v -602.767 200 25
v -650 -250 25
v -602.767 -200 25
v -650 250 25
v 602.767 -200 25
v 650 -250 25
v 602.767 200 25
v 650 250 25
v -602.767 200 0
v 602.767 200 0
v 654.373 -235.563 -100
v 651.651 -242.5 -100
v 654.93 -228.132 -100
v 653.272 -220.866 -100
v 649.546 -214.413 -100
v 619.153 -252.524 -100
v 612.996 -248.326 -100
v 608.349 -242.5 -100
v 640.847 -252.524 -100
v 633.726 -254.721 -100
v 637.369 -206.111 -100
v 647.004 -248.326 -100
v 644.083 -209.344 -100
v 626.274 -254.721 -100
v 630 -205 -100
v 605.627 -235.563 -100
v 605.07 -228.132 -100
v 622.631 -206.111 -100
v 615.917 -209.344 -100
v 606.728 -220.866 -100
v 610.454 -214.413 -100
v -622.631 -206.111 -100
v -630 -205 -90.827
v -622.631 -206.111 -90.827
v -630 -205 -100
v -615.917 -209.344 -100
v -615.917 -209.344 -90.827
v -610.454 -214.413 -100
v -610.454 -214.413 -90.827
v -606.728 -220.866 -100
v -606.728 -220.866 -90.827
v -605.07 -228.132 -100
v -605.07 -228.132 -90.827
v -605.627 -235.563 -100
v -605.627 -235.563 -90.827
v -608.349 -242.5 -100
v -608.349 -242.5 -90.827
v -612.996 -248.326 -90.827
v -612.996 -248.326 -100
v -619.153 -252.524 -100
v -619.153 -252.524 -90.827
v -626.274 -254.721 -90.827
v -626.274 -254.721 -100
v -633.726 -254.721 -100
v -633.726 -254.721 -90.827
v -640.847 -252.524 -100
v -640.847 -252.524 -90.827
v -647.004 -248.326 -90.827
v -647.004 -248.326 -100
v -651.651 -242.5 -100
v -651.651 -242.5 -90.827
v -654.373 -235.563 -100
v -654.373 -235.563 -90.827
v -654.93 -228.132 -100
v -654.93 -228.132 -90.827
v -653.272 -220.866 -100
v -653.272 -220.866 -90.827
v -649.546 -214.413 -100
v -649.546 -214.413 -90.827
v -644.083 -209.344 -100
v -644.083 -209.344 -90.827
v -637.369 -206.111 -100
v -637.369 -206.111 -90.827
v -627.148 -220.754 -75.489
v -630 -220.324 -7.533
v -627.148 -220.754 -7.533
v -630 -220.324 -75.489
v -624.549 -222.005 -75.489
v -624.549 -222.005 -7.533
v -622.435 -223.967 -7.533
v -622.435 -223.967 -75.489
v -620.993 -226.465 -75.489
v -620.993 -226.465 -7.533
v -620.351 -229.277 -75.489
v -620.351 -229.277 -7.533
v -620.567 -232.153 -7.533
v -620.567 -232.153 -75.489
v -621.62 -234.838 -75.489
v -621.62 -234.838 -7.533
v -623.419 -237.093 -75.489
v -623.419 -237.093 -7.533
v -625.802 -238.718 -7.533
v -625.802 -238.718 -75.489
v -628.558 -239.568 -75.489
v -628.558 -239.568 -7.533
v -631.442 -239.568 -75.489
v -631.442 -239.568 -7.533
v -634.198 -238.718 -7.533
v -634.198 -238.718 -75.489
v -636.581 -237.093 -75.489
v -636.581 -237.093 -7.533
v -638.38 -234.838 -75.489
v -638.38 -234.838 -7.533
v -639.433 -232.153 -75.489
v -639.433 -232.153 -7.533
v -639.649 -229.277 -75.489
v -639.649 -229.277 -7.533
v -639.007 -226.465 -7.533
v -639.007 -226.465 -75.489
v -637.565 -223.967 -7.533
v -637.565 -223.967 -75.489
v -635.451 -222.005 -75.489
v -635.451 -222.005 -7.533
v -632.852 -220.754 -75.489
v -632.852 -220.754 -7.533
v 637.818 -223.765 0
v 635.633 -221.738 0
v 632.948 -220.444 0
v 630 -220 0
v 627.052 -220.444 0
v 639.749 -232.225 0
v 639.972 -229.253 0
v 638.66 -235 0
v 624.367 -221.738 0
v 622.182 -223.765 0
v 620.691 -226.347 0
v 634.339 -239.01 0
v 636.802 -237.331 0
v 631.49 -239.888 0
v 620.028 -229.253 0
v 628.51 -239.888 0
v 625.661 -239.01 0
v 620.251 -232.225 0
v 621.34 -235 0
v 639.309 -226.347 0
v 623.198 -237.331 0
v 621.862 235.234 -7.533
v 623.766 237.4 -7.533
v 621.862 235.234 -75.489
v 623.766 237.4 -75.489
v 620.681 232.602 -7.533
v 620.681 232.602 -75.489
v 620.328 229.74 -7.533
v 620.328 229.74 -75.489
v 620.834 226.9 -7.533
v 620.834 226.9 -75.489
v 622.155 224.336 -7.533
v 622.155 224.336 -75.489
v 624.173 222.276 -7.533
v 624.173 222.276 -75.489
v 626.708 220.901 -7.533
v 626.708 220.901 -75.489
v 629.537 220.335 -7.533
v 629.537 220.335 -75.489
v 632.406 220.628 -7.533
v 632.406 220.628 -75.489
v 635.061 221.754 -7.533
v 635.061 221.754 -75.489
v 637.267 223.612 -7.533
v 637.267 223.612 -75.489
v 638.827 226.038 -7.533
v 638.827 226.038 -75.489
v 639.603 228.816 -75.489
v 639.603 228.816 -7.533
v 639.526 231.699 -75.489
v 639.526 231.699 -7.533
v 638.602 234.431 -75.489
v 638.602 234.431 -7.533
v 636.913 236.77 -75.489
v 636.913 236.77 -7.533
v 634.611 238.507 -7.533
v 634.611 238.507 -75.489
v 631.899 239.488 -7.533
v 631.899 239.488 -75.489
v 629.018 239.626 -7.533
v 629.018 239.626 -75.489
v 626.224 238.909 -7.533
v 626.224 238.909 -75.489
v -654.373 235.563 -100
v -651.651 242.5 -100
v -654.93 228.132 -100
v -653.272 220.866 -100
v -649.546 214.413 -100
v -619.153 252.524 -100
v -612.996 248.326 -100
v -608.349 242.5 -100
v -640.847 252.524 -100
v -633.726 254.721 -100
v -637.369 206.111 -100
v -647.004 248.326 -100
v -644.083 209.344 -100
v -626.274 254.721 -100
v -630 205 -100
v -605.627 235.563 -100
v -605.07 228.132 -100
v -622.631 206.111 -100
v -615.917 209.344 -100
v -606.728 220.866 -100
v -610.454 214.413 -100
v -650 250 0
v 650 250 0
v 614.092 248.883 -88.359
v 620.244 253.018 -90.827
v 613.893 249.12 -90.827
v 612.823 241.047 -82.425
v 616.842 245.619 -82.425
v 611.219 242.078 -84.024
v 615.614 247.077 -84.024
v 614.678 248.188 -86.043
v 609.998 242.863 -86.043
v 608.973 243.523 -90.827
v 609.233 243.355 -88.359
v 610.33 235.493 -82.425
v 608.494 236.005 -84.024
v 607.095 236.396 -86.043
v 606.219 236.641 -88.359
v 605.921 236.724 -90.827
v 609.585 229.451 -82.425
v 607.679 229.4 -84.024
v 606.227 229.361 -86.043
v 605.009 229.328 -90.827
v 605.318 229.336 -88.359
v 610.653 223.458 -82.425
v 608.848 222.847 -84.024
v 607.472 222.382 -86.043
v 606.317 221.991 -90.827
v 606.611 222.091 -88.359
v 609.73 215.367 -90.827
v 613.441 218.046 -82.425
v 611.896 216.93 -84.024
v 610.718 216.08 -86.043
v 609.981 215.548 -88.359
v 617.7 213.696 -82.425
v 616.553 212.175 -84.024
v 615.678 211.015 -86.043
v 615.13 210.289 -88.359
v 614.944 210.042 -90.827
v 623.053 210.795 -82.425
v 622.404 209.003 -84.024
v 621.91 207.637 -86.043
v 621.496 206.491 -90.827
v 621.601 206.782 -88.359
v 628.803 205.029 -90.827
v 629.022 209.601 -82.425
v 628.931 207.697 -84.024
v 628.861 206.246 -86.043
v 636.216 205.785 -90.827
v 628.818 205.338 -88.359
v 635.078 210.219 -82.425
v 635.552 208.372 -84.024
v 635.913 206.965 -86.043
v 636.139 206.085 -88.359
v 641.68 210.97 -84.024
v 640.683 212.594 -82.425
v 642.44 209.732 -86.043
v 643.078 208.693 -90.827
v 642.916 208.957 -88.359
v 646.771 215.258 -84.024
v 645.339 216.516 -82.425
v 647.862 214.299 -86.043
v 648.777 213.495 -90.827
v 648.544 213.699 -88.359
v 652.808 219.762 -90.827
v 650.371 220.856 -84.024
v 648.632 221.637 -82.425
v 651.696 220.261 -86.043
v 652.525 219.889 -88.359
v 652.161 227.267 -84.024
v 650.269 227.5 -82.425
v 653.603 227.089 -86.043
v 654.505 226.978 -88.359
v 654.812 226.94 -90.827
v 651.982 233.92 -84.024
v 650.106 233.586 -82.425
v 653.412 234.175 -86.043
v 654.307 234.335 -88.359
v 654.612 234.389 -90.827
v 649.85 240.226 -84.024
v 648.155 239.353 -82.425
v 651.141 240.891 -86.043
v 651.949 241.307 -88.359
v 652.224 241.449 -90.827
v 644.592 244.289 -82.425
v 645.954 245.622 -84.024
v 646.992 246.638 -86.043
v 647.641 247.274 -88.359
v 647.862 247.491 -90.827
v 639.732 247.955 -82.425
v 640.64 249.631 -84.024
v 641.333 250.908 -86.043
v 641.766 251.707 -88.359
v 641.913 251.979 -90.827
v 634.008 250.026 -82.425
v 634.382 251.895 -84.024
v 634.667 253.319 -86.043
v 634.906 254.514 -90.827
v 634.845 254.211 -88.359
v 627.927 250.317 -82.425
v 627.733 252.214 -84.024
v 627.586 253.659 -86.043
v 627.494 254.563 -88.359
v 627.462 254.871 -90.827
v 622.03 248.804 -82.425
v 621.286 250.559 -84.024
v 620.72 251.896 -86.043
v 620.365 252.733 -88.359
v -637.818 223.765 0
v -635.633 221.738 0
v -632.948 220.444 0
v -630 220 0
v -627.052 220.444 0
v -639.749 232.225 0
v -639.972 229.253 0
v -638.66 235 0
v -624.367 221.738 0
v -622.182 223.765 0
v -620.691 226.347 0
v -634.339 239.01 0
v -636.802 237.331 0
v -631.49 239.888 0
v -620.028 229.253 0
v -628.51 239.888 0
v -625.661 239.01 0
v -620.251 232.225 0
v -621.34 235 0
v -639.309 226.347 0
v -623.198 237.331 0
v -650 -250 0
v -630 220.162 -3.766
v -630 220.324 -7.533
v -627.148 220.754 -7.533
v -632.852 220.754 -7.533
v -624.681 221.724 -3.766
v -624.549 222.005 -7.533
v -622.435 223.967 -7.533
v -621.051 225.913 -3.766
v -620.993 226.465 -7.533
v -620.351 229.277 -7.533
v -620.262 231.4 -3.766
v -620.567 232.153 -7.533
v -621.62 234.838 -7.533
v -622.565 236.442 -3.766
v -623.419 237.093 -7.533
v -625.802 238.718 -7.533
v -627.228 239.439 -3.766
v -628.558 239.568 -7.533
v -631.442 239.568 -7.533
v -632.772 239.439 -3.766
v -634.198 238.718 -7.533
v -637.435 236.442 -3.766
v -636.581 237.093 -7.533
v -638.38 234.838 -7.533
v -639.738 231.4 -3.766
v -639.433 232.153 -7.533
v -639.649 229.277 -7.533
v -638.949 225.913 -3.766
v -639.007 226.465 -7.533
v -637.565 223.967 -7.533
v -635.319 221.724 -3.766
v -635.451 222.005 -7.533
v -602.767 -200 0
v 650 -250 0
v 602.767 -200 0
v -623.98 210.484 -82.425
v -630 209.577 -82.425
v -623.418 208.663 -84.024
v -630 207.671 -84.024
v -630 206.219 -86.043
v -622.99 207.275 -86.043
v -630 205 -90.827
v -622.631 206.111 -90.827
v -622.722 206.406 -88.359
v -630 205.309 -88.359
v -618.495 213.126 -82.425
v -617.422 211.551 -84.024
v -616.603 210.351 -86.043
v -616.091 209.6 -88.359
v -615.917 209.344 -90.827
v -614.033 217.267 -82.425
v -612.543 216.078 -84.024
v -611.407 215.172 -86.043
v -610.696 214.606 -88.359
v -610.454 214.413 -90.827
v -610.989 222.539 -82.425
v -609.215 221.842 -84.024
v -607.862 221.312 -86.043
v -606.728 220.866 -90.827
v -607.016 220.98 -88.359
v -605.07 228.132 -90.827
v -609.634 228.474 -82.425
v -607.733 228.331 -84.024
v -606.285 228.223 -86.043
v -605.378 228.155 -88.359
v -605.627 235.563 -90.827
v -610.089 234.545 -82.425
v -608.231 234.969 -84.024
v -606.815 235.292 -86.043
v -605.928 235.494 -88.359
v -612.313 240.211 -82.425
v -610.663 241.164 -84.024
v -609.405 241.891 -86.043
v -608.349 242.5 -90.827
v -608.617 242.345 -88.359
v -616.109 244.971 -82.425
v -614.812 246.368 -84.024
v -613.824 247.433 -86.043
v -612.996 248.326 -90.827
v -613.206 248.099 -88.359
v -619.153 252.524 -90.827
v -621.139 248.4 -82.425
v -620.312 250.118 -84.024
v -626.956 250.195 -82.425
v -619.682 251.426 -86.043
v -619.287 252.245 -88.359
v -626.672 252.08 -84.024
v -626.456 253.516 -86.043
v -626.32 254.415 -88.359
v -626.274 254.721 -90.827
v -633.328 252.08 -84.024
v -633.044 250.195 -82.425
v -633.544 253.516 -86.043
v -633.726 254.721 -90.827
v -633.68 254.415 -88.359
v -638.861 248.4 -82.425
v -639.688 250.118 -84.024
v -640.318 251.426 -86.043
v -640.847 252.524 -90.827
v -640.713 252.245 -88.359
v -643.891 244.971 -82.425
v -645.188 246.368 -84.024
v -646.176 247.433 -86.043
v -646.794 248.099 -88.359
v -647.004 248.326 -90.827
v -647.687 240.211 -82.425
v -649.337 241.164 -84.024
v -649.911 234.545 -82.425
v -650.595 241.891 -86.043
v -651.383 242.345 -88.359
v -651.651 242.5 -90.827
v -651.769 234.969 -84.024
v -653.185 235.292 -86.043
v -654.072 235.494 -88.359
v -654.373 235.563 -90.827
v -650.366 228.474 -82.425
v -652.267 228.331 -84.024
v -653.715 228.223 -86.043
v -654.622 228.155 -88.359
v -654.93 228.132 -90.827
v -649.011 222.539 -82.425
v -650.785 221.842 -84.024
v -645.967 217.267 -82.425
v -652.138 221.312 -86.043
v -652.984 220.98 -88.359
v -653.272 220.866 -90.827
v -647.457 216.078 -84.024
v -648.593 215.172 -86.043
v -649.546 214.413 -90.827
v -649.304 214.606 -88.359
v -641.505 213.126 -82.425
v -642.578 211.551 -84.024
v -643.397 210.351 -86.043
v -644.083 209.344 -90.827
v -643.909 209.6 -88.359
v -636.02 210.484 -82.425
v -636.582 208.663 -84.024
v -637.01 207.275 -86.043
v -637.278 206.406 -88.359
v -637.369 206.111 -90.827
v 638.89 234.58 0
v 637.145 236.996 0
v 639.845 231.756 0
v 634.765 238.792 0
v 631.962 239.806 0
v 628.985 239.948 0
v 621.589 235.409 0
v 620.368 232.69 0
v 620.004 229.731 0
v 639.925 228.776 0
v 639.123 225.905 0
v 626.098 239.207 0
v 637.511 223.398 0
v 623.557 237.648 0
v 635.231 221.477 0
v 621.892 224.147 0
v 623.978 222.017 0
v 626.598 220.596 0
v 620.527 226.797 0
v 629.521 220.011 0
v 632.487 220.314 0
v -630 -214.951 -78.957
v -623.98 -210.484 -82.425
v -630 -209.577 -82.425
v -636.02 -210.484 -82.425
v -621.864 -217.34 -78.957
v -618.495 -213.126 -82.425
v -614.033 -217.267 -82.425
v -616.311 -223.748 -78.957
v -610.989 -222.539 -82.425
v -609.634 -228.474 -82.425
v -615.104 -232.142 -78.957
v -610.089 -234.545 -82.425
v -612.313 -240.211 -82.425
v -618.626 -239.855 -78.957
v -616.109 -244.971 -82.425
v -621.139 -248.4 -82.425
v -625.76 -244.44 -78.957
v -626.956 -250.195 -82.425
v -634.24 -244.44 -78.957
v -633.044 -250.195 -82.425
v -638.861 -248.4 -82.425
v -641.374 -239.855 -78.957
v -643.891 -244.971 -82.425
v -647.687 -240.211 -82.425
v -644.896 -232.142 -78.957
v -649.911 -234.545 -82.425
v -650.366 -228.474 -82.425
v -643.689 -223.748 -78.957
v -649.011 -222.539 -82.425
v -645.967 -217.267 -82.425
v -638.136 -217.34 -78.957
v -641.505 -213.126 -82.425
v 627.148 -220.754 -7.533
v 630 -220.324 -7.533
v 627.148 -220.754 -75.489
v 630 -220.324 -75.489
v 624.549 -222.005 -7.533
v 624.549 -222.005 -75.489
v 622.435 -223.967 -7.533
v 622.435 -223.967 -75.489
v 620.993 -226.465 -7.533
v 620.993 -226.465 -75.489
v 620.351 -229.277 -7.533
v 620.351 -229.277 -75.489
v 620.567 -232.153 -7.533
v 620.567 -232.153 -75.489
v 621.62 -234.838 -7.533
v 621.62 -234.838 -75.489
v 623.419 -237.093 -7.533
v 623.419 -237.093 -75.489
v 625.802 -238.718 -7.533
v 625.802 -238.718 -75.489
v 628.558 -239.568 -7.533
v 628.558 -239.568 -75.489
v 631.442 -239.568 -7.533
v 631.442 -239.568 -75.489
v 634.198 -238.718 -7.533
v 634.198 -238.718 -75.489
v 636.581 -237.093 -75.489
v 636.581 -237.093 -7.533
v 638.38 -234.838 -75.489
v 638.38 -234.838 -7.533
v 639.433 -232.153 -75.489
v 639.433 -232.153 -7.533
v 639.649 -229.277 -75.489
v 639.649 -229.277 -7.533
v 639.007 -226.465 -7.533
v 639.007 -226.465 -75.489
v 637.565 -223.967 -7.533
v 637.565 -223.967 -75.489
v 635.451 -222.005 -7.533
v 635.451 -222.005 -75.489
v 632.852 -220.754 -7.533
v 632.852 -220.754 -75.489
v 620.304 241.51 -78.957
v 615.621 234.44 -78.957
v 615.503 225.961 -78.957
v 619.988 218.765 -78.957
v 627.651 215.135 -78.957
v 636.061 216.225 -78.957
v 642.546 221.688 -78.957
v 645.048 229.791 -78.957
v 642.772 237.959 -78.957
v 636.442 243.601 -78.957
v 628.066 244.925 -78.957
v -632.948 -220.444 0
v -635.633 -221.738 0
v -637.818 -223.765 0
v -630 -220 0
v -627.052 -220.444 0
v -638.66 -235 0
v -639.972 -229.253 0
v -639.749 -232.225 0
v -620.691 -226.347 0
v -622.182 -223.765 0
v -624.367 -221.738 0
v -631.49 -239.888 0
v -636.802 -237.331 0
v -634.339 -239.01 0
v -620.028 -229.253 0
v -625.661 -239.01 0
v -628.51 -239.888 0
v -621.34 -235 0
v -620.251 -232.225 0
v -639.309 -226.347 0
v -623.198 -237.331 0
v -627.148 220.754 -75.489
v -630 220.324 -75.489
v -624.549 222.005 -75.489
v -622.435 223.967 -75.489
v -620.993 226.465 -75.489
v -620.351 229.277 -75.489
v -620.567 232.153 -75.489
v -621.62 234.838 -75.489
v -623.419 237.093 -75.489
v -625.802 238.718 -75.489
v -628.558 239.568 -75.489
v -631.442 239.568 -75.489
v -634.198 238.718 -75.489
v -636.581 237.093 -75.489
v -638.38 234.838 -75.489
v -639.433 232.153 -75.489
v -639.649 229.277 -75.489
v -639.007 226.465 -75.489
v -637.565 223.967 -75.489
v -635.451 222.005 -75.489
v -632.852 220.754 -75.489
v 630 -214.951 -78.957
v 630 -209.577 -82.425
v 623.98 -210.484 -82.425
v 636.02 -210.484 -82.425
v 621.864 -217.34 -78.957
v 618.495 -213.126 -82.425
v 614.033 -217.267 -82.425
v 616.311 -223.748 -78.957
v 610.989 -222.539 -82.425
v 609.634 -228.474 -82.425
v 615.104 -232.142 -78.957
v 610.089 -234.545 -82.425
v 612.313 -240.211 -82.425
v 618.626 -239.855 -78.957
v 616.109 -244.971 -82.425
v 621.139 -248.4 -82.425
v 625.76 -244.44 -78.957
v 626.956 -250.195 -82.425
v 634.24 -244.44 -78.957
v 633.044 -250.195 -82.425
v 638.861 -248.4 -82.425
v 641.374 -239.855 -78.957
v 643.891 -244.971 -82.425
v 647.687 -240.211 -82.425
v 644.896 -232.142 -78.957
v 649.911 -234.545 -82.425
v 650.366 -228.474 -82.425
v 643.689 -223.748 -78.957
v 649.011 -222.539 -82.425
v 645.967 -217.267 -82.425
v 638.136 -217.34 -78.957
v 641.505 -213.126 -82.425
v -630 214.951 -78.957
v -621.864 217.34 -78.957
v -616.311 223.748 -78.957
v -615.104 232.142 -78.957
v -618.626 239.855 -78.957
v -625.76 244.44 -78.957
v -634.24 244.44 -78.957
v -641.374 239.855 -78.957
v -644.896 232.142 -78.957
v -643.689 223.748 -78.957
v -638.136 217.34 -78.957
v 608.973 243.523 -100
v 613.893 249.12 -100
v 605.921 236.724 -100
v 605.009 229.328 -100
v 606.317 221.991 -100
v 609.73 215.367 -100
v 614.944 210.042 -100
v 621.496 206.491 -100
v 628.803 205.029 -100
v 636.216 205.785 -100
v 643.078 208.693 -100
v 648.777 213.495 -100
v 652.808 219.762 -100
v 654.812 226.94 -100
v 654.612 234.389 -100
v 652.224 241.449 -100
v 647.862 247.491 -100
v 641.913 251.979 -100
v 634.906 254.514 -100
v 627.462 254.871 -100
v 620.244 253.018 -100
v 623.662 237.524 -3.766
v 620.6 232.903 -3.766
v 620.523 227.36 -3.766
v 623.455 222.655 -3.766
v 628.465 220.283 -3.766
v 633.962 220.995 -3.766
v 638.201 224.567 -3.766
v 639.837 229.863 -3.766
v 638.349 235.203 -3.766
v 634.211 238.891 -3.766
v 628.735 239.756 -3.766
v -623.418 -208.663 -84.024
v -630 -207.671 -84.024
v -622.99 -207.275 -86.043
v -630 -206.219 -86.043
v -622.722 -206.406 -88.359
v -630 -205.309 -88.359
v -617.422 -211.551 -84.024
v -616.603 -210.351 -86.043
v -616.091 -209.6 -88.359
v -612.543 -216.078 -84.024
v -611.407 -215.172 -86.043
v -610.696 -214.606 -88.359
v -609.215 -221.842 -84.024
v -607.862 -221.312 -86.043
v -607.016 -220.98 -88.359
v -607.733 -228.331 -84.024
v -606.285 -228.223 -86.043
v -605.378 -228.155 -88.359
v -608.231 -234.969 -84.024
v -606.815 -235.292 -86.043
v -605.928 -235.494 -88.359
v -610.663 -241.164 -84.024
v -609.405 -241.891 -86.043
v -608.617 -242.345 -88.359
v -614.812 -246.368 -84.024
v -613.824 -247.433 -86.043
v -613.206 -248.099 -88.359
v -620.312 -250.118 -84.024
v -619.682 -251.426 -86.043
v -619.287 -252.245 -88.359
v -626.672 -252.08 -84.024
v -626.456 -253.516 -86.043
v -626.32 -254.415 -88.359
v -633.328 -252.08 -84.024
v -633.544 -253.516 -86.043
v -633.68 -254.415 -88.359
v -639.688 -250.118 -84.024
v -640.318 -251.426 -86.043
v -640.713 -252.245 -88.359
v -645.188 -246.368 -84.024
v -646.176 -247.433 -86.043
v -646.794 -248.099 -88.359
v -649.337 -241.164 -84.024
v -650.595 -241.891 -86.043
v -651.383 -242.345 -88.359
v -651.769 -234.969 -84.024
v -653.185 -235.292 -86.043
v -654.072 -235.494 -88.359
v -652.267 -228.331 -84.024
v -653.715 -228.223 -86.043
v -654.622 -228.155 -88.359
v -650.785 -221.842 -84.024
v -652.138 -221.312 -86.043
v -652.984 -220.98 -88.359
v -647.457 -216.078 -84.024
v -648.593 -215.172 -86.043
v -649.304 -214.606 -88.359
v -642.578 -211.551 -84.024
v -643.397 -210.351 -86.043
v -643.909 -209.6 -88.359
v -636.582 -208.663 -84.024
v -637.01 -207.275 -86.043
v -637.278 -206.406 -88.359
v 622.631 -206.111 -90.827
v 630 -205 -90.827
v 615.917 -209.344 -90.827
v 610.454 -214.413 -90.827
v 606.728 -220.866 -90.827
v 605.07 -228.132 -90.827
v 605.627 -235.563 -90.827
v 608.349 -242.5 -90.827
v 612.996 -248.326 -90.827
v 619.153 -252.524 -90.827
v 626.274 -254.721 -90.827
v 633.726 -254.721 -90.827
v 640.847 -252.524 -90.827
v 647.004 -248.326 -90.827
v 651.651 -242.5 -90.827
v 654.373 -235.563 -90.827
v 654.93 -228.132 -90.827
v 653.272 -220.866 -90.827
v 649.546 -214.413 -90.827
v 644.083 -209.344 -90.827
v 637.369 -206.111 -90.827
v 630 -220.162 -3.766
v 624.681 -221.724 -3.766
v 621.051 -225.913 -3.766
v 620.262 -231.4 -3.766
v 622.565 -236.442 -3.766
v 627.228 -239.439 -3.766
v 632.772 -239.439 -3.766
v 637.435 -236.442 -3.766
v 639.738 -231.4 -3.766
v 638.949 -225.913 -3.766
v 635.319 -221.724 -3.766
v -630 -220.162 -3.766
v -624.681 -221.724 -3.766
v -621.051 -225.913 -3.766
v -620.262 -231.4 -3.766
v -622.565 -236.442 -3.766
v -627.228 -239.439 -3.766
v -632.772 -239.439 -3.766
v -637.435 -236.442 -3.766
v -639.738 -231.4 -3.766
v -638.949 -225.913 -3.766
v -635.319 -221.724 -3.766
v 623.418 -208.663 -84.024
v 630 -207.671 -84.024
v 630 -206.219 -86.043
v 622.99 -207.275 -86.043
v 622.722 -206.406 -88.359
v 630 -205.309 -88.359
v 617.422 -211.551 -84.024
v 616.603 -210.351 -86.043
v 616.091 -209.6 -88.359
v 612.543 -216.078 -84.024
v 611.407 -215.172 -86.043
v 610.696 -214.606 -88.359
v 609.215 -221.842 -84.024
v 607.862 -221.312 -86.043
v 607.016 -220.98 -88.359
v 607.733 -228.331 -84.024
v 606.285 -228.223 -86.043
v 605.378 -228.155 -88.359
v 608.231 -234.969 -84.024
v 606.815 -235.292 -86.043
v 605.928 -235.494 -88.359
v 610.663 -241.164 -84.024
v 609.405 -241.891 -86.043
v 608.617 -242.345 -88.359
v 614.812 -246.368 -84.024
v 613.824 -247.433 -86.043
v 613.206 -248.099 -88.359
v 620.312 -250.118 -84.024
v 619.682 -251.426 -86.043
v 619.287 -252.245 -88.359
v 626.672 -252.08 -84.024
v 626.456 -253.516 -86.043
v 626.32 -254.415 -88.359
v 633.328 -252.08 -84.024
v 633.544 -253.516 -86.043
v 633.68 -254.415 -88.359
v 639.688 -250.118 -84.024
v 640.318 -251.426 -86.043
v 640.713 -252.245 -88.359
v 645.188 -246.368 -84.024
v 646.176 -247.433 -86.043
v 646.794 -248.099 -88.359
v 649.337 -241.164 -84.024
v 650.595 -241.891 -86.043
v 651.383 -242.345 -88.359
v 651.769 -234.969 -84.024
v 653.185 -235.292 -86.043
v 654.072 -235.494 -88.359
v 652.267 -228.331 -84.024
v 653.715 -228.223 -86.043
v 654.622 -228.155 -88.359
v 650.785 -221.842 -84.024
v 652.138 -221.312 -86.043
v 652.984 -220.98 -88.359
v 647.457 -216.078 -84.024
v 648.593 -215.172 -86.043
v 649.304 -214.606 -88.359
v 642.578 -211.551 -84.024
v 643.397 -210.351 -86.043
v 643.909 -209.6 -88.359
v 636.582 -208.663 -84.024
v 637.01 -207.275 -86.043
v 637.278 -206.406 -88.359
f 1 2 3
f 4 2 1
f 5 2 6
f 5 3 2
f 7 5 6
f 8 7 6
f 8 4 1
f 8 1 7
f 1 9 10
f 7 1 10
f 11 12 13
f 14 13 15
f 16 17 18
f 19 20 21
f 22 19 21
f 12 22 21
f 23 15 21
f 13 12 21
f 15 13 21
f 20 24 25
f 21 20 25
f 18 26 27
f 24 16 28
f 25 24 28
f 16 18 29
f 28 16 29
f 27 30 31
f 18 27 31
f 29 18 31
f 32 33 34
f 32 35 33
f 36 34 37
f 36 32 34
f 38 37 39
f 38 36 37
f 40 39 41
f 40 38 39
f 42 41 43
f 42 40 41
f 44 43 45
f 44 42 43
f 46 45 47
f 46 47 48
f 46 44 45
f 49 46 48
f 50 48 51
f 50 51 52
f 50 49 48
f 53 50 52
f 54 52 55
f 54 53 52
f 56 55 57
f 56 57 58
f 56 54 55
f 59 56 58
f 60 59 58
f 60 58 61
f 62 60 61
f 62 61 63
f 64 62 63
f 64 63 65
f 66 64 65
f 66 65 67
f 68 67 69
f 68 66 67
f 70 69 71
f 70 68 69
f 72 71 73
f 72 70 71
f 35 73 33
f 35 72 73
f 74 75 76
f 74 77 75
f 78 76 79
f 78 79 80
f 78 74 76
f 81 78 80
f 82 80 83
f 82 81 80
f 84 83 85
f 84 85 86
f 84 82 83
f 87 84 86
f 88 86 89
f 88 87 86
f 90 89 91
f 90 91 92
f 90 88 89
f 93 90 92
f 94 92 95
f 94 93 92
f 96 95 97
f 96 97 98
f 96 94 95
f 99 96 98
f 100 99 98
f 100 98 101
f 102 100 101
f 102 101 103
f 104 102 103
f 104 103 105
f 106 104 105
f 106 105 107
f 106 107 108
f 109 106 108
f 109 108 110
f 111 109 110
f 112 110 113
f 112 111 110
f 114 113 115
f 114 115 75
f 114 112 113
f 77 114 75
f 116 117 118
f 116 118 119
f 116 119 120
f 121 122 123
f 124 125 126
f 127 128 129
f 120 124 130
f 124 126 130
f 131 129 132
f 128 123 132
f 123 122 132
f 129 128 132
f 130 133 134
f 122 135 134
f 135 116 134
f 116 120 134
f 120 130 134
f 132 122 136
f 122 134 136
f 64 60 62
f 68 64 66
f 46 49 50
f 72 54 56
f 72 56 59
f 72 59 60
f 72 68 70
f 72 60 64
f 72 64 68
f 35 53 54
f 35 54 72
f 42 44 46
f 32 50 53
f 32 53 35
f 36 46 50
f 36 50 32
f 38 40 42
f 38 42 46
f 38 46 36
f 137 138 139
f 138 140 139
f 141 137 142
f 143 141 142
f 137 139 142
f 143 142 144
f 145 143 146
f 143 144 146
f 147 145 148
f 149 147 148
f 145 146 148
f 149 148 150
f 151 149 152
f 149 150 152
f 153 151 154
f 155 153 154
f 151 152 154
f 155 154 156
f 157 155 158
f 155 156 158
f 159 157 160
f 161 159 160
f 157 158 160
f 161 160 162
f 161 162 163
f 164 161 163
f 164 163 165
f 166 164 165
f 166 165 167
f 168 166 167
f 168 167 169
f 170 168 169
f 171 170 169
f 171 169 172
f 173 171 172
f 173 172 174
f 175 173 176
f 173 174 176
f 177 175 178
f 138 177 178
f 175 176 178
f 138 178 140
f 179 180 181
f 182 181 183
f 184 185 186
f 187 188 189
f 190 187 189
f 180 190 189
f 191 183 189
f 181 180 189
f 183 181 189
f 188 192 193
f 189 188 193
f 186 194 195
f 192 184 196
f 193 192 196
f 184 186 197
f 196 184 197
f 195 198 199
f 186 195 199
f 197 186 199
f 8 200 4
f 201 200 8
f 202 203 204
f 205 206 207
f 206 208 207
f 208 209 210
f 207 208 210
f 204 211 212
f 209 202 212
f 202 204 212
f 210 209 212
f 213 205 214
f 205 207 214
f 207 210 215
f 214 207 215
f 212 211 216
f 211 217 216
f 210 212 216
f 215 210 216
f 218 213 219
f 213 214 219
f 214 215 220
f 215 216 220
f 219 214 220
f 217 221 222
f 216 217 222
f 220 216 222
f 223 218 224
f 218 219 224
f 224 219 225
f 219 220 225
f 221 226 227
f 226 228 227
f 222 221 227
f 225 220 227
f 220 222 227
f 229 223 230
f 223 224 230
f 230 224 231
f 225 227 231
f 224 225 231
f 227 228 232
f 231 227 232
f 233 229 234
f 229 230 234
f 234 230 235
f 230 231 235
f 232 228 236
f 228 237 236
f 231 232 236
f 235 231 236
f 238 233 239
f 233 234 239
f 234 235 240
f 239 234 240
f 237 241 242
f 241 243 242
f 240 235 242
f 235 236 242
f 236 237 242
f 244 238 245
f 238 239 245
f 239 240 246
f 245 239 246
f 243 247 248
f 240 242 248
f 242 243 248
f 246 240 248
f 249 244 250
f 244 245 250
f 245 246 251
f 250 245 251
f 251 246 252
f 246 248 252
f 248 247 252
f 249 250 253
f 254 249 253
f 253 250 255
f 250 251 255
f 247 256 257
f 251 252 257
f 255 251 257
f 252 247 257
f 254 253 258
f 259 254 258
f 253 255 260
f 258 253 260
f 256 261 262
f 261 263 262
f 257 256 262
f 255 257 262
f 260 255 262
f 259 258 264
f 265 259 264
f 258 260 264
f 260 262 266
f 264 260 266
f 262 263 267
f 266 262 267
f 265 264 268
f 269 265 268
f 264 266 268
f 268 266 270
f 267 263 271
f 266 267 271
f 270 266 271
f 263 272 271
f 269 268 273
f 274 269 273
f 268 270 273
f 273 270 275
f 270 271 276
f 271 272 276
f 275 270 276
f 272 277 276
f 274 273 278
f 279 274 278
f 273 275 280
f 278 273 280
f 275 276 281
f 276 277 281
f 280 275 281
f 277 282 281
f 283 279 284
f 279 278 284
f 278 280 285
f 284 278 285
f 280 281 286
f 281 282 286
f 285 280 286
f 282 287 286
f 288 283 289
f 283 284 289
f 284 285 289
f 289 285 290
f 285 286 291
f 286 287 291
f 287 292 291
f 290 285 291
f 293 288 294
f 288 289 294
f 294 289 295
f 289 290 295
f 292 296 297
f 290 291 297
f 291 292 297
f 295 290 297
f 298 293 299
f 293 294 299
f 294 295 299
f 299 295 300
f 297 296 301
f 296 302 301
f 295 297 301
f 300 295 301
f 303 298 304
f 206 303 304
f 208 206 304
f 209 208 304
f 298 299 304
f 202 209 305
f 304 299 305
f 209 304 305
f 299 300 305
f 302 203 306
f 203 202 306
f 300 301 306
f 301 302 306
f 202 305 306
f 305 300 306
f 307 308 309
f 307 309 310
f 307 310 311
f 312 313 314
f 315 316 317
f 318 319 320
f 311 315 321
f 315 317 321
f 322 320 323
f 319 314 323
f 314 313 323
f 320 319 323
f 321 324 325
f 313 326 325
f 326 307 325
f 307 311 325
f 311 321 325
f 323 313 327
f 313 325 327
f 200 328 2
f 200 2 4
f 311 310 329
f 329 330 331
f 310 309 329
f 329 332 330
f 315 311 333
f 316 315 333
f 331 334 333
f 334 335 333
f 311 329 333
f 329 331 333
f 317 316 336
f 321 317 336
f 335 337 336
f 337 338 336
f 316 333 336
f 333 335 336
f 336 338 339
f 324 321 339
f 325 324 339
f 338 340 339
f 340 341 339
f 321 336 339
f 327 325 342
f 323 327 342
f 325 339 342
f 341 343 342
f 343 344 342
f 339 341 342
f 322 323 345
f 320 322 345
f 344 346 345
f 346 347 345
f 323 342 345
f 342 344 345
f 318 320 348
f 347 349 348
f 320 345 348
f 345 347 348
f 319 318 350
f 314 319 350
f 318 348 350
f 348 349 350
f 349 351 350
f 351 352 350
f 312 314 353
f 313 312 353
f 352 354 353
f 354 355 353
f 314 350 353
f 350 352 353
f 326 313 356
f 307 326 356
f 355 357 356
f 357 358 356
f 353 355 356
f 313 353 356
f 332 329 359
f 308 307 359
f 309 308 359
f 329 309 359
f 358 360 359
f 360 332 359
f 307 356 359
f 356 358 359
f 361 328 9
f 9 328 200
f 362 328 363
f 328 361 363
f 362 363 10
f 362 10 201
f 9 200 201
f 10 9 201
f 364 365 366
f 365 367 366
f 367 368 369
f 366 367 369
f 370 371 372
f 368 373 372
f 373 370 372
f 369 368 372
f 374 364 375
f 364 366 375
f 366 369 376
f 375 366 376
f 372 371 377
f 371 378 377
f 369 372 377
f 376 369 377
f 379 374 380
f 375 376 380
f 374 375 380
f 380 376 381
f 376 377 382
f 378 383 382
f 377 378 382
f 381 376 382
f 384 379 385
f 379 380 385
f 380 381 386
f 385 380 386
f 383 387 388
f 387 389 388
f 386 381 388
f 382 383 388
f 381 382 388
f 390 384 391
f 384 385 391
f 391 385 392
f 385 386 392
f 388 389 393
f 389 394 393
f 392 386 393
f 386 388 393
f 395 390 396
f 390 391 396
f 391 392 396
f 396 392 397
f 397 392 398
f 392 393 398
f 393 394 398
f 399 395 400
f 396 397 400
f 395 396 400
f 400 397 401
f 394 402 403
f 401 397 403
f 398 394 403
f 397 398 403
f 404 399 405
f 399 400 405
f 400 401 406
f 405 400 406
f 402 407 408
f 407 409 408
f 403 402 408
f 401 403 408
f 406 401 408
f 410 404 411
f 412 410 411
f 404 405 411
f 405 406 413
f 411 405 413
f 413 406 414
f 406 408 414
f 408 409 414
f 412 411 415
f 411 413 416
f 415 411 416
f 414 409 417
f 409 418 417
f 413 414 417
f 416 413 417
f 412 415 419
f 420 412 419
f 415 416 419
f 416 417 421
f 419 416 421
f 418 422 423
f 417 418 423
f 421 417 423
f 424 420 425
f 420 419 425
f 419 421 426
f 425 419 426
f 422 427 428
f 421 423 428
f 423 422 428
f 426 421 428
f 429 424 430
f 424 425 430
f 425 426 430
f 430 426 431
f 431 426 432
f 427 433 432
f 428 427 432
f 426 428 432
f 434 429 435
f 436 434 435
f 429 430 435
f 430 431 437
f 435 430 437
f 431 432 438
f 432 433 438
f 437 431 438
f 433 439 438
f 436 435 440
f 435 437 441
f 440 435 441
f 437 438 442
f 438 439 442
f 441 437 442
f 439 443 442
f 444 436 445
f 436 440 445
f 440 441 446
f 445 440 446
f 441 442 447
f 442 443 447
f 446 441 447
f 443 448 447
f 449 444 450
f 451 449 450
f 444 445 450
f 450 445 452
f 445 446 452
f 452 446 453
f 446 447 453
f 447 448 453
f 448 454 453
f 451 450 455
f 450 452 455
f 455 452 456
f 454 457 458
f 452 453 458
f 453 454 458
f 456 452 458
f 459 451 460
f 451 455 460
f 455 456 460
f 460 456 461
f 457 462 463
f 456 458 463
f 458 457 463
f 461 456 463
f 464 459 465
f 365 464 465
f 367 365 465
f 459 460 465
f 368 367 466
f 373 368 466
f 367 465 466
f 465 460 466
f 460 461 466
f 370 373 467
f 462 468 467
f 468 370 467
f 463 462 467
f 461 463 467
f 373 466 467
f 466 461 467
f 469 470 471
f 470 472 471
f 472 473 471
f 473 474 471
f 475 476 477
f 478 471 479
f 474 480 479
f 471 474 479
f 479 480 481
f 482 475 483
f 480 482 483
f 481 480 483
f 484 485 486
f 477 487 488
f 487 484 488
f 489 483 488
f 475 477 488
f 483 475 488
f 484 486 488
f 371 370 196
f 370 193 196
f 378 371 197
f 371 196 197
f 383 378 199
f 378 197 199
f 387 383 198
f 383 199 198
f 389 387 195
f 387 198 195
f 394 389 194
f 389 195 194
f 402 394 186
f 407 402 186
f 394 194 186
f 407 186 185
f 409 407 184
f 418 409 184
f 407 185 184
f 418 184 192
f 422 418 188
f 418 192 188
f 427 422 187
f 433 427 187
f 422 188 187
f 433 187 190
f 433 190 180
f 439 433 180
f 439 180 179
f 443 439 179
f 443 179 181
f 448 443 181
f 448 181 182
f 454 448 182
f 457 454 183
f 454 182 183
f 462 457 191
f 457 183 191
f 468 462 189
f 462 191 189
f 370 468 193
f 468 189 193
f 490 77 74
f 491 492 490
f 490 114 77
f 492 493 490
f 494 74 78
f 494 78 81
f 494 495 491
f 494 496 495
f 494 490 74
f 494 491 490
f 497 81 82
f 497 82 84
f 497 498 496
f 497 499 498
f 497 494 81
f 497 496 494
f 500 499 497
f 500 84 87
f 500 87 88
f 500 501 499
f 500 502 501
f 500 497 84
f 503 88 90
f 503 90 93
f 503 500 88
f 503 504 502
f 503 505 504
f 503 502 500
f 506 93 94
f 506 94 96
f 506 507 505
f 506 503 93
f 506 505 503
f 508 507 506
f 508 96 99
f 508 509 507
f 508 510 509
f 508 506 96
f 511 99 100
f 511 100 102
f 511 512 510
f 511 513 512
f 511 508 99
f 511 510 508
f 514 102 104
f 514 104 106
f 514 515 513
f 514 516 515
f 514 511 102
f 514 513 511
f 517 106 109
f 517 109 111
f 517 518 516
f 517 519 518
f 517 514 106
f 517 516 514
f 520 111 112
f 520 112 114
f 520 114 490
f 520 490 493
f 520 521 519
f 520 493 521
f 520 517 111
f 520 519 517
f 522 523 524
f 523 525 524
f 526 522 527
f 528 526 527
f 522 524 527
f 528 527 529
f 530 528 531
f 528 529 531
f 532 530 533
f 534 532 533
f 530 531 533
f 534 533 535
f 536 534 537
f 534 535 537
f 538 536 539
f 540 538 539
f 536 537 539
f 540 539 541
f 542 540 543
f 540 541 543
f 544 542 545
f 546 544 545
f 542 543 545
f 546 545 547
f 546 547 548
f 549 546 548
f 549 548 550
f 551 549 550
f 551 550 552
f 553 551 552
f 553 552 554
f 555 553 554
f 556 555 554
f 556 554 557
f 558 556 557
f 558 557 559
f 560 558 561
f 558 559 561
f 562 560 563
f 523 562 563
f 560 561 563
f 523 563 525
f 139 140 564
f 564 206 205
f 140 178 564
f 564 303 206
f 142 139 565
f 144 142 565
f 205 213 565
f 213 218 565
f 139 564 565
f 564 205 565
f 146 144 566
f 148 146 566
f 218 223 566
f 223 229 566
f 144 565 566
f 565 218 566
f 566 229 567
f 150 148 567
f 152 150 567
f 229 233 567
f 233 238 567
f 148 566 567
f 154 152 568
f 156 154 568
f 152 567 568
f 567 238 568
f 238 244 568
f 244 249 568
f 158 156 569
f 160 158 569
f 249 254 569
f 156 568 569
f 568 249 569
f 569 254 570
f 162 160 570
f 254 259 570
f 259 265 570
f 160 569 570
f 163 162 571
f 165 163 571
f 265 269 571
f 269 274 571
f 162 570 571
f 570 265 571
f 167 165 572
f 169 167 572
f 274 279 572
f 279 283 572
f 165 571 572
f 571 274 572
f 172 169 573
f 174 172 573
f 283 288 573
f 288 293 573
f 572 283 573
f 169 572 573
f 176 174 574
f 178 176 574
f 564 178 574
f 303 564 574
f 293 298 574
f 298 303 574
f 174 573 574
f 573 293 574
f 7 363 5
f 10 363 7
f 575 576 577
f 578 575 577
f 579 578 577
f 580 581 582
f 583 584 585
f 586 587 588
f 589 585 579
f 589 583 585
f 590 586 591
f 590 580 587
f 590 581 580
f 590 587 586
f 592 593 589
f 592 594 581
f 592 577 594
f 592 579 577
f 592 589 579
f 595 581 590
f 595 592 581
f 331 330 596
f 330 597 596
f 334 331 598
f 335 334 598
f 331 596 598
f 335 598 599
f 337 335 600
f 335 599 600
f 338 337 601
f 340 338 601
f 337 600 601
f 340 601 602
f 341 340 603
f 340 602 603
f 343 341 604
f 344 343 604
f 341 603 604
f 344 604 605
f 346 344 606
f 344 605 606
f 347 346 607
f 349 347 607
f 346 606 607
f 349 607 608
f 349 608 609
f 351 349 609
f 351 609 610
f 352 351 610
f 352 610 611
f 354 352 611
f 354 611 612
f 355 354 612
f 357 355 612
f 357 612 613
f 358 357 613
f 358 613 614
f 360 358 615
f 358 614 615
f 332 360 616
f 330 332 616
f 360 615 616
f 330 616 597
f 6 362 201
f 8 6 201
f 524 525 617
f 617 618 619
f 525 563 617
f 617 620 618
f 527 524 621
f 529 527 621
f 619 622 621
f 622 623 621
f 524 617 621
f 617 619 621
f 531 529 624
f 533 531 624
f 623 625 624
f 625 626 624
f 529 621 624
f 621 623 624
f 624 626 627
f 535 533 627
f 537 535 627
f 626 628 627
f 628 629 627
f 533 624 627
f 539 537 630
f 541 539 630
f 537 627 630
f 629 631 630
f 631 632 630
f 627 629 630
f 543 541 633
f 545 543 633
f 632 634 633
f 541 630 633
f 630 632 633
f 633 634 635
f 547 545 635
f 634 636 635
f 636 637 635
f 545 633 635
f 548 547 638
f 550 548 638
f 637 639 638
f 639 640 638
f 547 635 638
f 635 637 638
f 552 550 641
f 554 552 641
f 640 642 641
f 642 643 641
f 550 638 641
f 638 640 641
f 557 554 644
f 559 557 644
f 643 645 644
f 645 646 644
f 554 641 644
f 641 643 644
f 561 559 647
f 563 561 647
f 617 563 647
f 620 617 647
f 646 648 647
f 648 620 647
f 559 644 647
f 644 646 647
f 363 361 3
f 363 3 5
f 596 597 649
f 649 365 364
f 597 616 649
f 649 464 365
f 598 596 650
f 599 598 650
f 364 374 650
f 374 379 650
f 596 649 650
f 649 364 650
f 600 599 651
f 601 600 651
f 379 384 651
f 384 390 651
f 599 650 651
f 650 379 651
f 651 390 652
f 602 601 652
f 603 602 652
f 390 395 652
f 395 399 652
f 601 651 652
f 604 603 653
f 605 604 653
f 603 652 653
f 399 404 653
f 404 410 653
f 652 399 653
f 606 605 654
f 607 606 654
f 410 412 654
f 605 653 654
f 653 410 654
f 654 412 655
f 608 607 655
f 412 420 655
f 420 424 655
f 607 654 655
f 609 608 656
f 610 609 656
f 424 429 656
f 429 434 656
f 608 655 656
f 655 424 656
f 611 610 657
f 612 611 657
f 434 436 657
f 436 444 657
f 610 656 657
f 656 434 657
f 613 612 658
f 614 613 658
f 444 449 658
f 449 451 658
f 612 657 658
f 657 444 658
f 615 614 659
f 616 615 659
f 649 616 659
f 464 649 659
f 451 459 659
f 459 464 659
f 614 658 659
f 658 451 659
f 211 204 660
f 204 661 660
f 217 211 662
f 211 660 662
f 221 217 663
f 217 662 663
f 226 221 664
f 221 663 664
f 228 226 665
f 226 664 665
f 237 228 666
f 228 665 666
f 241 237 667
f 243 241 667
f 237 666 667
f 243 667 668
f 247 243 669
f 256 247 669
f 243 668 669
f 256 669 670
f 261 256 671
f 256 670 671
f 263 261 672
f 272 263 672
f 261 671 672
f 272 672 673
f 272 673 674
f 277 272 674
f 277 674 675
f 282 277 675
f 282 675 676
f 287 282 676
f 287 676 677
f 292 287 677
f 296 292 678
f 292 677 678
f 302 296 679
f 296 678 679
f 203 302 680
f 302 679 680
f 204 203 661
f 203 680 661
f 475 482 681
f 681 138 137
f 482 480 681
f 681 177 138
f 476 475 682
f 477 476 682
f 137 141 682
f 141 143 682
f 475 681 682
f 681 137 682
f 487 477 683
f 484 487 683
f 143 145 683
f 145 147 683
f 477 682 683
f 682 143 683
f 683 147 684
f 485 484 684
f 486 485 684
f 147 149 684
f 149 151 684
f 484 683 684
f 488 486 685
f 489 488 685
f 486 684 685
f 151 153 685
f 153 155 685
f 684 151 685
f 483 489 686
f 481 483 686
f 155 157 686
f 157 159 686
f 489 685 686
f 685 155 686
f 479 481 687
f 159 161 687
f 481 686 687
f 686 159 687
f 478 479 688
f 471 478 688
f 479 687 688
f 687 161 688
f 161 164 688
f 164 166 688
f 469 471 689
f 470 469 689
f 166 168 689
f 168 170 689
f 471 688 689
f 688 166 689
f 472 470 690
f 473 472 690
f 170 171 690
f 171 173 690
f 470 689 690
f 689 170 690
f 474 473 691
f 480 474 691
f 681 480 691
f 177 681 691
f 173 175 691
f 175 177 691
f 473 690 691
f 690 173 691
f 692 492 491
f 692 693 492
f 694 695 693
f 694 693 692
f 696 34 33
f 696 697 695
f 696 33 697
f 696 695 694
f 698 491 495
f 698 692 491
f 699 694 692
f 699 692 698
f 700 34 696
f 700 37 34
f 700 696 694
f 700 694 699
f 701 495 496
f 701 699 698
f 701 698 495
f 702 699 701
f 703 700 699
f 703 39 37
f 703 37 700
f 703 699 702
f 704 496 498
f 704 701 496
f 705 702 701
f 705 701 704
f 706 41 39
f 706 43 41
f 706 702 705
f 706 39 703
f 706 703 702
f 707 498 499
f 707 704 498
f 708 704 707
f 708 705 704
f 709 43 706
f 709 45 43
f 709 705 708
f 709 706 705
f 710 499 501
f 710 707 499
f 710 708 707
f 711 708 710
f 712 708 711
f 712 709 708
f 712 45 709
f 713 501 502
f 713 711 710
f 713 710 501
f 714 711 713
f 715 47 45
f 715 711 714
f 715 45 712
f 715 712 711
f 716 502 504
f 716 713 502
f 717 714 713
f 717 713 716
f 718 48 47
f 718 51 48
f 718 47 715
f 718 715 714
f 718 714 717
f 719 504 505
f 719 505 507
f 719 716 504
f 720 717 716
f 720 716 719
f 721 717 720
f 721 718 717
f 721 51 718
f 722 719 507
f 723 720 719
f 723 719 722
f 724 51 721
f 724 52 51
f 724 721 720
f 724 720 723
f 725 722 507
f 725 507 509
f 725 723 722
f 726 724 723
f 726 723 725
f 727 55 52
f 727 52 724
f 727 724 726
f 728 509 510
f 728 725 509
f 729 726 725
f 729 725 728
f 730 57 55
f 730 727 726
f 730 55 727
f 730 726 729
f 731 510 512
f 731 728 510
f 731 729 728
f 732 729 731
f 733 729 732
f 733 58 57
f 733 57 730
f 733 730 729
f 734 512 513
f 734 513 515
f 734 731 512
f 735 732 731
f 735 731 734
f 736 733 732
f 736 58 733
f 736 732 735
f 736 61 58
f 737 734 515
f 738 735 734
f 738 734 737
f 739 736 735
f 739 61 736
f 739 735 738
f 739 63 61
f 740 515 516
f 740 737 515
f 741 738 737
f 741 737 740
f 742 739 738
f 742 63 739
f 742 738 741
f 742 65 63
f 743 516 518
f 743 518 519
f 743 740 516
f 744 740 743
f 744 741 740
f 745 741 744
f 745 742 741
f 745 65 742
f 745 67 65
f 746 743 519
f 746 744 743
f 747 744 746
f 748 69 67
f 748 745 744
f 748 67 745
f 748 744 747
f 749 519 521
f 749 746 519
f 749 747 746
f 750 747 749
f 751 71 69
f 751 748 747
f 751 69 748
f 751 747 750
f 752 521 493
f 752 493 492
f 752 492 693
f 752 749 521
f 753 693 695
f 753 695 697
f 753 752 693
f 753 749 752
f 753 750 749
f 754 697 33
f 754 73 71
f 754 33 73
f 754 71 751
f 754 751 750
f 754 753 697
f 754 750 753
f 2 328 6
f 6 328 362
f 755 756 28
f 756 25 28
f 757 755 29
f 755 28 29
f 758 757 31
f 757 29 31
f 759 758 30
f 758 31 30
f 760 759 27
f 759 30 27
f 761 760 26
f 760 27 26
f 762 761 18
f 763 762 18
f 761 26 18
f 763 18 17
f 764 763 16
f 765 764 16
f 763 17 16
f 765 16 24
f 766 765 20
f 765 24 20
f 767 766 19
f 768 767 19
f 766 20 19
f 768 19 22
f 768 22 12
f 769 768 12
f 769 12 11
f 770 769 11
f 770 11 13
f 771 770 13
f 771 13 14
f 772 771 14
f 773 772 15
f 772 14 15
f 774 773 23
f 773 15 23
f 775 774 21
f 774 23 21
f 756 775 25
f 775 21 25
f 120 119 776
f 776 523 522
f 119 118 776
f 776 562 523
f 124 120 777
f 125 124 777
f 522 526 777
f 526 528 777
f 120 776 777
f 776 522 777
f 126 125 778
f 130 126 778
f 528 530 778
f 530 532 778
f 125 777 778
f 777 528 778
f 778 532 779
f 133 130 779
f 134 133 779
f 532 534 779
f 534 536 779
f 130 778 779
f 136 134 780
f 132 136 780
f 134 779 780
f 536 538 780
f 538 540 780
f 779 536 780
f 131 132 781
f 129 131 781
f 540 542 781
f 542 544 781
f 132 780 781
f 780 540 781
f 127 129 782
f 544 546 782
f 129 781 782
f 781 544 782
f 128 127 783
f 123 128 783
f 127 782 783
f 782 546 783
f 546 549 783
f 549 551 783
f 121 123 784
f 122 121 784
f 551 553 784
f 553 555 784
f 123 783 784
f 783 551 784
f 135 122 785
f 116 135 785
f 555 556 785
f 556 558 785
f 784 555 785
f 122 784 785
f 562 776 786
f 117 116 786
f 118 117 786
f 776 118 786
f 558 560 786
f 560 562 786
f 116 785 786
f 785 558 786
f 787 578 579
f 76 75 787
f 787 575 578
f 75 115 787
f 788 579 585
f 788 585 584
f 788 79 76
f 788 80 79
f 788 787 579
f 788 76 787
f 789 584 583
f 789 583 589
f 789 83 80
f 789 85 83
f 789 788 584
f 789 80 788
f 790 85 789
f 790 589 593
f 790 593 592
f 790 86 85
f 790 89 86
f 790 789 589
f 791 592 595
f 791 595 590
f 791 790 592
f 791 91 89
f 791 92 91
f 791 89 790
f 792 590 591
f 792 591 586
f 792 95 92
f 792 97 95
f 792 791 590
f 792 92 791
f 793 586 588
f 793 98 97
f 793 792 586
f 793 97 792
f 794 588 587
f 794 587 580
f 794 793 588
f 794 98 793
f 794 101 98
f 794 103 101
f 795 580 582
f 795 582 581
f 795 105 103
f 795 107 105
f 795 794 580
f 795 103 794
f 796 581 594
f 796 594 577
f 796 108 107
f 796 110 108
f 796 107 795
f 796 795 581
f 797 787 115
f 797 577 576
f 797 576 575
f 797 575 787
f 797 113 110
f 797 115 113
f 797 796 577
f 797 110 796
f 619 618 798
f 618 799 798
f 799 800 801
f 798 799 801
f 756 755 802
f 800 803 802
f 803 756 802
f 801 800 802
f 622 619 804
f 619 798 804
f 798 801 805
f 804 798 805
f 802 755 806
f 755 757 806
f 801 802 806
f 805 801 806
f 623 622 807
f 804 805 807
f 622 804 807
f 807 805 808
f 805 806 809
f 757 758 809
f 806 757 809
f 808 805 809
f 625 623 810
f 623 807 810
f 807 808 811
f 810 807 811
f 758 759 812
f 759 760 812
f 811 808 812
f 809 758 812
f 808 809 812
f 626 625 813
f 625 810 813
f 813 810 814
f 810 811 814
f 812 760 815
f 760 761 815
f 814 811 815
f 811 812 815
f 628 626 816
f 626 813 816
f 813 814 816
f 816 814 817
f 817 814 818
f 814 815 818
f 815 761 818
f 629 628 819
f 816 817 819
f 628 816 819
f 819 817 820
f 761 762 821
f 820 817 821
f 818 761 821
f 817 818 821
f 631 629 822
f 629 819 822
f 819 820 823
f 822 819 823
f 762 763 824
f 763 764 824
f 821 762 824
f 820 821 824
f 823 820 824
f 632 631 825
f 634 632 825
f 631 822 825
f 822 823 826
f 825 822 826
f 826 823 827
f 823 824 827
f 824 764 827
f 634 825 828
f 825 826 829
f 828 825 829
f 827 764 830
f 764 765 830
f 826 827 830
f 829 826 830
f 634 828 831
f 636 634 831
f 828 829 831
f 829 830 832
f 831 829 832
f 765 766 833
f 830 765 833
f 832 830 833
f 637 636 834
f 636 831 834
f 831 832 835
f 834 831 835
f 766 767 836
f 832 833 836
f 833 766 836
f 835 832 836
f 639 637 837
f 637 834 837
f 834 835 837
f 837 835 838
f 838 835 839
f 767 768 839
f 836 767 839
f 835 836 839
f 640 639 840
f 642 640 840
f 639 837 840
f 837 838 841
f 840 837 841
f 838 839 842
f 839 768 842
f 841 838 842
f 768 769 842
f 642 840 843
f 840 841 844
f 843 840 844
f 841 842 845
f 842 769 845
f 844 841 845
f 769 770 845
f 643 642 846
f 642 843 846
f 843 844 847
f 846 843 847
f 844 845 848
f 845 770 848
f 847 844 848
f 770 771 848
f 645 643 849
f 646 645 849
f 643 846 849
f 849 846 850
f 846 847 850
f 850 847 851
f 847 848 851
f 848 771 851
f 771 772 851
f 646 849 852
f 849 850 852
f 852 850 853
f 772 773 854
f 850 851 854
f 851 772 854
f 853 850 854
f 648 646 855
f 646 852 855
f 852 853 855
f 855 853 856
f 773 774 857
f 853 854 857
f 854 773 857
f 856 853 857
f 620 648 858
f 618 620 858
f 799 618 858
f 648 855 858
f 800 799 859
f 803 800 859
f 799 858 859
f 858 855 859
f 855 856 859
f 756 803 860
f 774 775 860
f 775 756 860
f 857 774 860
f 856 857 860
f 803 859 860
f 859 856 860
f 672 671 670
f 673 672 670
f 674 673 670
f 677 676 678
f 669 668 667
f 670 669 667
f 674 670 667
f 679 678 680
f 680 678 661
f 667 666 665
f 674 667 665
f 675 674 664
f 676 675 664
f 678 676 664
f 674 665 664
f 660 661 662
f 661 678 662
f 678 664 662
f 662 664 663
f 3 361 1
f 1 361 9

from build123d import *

# Parameters (mm, degrees)
F7_W     = 1300
F7_H     = 500
F7_W_2   = 1205.5341005325
F7_H_2   = 400
F8_DEPTH = 25


# Not quite as in the source:
# - a pattern or mirror of a feature is missing from the dataset's text; its kind, count and spacing are read off the source's solid


with BuildPart() as f6:
    # F5 (on line) → F6 (revolve)
    with BuildSketch(Plane(origin=(-630, 0, 0), x_dir=(0, -1, 0), z_dir=(-1, 0, 0))):
        with BuildLine():
            Line((230, 0), (220, 0))
            Line((220, 0), (220.3241423469, -7.5328363425))
            Line((220.3241423469, -7.5328363425), (220.3241423469, -75.4886860348))
            Line((220.3241423469, -75.4886860348), (209.5771272384, -82.4251501433))
            ThreePointArc((209.5771272384, -82.4251501433), (206.2185215477, -86.0431881155), (205, -90.8270815291))
            Line((205, -90.8270815291), (205, -100))
            Line((205, -100), (230, -100))
            Line((230, -100), (230, 0))
        make_face()
    revolve(axis=Axis((-630, -230, -56.9955855608), (0, 0, -1)))


with BuildPart() as f6_copies_1:
    # F6_copies: instance of F6
    add(f6.part.mirror(Plane(origin=(0, 0, 0), x_dir=(-0.3429399739, 0.9393573198, 0), z_dir=(0.9393573198, 0.3429399739, 0))))


with BuildPart() as f6_copies1_1:
    # F6_copies1: instance of F6
    add(f6.part.mirror(Plane(origin=(0, 0, 0), x_dir=(0, 0, 1), z_dir=(1, 0, 0))))


with BuildPart() as f6_copies2_1:
    # F6_copies2: instance of F6
    add(f6.part.mirror(Plane.ZX))


with BuildPart() as f8:
    # F7 (on face) → F8 (new body)
    with BuildSketch(Plane.XY):
        Rectangle(F7_W, F7_H)
        Rectangle(F7_W_2, F7_H_2, mode=Mode.SUBTRACT)
    extrude(amount=F8_DEPTH)


solid = Compound([f6.part, f6_copies_1.part, f6_copies1_1.part, f6_copies2_1.part, f8.part])
